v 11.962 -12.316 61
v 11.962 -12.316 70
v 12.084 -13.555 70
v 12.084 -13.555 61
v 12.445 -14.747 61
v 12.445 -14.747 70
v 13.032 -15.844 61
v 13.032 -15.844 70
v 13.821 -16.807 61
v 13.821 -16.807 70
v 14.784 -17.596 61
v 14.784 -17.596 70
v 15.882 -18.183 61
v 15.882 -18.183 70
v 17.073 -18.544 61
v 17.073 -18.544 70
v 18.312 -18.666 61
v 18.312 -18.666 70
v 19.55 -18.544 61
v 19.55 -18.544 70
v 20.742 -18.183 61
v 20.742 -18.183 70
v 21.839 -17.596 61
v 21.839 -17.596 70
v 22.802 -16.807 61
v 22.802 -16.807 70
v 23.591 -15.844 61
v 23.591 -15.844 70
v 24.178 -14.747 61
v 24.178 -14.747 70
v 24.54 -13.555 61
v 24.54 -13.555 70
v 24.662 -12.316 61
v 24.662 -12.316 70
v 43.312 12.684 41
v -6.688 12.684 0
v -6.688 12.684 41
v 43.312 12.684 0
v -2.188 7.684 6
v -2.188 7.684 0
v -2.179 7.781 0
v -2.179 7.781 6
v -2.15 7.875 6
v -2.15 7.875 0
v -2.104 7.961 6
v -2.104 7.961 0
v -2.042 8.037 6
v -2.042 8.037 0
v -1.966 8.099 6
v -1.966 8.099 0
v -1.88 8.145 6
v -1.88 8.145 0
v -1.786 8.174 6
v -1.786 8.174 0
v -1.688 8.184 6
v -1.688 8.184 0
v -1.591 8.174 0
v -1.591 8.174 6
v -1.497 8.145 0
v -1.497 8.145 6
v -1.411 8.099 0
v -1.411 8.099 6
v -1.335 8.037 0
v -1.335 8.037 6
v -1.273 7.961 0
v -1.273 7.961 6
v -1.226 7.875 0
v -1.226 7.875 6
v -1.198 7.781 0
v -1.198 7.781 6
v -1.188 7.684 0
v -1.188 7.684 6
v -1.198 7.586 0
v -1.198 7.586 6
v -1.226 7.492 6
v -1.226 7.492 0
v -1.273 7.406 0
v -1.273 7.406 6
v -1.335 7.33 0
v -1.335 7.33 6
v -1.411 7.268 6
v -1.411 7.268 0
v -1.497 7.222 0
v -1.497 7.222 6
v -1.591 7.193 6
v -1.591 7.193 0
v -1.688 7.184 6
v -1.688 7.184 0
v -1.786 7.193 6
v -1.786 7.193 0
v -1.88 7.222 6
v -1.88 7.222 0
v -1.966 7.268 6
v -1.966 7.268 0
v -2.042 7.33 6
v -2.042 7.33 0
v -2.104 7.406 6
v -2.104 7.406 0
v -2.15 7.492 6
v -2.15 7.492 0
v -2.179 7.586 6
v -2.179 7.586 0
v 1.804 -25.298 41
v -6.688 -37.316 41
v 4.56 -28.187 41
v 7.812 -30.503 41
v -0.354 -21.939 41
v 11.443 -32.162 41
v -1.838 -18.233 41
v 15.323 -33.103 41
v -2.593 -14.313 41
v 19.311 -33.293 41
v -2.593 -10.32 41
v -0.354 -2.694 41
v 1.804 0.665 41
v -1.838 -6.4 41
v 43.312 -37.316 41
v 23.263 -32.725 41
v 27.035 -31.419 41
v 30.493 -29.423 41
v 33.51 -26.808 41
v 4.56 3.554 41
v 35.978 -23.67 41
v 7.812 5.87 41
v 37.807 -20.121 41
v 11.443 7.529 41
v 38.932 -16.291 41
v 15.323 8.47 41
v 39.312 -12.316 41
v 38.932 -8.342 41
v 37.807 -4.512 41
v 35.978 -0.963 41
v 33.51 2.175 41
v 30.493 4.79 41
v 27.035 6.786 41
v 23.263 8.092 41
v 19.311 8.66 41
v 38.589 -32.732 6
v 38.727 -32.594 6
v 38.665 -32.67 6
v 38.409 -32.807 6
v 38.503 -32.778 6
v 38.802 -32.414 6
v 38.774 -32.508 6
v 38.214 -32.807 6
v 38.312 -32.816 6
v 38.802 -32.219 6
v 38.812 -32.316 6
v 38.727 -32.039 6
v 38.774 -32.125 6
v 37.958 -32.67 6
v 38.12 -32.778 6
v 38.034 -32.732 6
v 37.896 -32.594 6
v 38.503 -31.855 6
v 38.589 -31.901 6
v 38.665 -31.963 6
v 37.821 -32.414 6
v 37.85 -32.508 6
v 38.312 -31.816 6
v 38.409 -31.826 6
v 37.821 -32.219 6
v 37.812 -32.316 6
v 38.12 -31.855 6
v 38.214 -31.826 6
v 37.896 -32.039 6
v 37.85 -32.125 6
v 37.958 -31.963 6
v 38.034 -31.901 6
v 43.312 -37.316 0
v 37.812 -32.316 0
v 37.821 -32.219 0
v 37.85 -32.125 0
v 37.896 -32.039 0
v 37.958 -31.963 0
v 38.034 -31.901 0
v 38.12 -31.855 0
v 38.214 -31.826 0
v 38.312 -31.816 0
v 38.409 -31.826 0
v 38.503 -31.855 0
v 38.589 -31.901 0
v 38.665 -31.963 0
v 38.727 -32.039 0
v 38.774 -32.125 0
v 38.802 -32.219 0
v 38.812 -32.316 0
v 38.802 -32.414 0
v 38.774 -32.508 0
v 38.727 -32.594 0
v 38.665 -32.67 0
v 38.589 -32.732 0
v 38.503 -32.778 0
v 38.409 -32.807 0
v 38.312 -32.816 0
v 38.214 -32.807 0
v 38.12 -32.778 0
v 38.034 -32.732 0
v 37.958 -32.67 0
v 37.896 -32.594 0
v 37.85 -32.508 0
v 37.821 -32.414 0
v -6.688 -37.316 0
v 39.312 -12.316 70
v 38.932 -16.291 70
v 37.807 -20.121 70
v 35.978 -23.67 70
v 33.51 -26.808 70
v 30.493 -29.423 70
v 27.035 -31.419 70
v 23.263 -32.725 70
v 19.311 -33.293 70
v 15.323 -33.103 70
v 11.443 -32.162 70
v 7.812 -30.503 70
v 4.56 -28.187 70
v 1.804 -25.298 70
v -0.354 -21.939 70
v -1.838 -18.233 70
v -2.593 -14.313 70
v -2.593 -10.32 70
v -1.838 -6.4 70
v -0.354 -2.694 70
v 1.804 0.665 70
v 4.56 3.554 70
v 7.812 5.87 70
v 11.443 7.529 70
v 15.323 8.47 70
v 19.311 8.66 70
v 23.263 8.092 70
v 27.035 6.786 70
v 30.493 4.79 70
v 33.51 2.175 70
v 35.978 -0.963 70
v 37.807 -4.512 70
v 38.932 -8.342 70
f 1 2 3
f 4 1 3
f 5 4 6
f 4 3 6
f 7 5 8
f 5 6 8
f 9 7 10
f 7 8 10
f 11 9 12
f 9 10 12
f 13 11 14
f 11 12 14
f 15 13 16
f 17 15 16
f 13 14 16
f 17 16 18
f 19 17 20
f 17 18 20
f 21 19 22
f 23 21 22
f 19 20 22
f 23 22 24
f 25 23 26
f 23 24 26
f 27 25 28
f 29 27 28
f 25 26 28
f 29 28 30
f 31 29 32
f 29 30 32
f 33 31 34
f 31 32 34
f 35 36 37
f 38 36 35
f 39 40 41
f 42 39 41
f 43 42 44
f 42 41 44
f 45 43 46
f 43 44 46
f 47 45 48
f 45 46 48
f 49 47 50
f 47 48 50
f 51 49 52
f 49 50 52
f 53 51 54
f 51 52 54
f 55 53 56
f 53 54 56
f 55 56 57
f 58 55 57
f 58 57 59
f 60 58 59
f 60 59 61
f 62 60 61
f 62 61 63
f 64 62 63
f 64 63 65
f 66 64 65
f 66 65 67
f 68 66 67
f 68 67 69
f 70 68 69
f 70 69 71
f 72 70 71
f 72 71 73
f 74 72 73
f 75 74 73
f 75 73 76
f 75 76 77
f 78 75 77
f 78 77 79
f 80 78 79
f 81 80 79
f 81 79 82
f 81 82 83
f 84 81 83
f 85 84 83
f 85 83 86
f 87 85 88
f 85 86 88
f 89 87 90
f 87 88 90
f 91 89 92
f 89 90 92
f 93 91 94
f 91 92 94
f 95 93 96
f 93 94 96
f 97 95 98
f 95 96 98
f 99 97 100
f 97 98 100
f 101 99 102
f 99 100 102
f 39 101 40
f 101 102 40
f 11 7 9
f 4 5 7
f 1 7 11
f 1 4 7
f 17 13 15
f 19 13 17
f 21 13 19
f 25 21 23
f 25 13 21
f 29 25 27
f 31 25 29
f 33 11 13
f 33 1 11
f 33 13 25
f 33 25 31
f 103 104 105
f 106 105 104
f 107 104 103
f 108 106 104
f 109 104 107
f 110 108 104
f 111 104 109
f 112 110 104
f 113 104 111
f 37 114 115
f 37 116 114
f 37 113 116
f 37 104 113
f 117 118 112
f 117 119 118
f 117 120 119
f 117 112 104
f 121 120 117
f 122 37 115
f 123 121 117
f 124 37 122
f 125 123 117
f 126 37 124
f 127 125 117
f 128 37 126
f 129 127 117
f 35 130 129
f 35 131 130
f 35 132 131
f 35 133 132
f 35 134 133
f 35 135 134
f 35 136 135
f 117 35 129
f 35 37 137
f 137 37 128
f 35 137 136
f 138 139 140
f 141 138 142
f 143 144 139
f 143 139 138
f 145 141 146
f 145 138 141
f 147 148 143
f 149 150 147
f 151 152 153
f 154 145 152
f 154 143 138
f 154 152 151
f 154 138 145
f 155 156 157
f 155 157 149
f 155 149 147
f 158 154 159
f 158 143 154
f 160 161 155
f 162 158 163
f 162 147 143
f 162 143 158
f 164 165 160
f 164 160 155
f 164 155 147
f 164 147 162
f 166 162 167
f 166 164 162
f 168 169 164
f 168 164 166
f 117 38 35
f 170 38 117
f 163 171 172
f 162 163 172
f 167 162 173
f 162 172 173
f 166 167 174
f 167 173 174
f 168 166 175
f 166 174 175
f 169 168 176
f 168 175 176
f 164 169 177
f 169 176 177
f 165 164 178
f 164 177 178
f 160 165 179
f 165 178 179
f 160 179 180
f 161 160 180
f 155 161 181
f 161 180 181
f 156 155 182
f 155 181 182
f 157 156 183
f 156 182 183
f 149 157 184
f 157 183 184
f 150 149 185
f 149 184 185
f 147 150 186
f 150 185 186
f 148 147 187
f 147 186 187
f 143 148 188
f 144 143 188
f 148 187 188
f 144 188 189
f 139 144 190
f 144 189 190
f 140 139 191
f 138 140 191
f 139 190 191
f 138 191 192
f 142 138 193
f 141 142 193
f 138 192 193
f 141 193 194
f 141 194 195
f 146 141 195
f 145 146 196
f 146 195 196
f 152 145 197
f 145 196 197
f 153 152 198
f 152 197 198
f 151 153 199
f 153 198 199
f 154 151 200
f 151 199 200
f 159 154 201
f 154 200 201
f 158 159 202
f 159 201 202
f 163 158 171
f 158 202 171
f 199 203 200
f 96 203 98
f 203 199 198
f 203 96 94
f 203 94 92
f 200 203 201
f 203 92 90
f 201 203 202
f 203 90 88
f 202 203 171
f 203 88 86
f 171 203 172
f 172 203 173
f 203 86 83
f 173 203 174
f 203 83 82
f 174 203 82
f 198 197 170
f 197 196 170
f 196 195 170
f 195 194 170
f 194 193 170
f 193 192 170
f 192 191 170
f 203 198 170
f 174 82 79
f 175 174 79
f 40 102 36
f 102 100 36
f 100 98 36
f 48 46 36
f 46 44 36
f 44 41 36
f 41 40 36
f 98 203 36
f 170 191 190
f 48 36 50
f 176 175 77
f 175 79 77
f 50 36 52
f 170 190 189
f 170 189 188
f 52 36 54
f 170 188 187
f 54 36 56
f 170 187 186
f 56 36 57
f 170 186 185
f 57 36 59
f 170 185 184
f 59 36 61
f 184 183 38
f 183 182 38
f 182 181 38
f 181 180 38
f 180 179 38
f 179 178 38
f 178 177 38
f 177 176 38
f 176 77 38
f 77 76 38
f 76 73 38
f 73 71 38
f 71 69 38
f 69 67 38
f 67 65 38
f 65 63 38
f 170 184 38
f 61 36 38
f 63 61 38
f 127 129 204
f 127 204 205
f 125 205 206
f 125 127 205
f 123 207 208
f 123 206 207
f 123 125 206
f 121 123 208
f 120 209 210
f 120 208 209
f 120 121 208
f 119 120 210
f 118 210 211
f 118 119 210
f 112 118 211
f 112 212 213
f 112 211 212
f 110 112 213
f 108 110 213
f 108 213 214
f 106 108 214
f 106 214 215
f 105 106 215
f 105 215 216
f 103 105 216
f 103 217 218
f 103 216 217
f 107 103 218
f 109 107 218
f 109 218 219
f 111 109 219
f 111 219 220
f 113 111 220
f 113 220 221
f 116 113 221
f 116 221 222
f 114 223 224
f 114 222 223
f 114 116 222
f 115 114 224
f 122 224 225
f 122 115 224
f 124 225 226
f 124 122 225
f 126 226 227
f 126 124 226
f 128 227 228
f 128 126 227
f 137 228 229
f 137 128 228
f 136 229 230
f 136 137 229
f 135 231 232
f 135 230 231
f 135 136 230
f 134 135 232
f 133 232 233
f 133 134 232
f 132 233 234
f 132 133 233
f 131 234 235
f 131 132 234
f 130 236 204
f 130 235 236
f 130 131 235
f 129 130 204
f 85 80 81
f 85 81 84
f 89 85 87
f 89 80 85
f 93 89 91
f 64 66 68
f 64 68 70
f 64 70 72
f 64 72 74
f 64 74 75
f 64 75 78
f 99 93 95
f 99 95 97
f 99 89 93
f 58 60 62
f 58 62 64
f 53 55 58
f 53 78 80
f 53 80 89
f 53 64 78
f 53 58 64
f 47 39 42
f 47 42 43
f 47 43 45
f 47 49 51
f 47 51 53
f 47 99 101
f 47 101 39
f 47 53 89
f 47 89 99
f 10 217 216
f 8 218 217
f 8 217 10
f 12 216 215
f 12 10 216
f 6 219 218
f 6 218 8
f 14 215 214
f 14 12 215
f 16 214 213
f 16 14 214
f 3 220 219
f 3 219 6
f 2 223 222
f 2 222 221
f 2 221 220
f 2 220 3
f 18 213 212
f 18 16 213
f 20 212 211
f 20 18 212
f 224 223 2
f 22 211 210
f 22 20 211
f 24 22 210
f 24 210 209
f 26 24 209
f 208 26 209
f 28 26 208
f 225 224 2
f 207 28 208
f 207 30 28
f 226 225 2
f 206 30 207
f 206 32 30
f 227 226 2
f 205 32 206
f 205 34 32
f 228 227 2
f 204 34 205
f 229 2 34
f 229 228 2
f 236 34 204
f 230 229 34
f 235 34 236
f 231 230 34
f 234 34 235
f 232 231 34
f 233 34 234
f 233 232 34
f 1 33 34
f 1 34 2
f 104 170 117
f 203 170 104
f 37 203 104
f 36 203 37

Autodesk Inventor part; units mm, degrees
ref_plane "YZ Plane" through (0, 0, 0) normal (1, 0, 0) x (0, 1, 0)
ref_plane "XZ Plane" through (0, 0, 0) normal (0, 1, 0) x (-1, 0, 0)
ref_plane "XY Plane" through (0, 0, 0) normal (0, 0, 1) x (1, 0, 0)
sketch "Sketch1" plane through (0, 0, 0) normal (0, 0, 1) x (1, 0, 0)
  line L0 (-6.6884, 12.6835) -> (43.3116, 12.6835)
  line L1 (43.3116, 12.6835) -> (43.3116, -37.3165)
  line L2 (43.3116, -37.3165) -> (-6.6884, -37.3165)
  line L3 (-6.6884, -37.3165) -> (-6.6884, 12.6835)
  point P0 (0, 0)
  dimension "d0" = 50
  dimension "d1" = 50
extrude "Extrusion1" add sketch "Sketch1" along normal blind 41
sketch "Sketch2" plane through (0, 0, 41) normal (0, 0, 1) x (1, 0, 0)
  circle A0 centre (18.3116, -12.3165) radius 21
  point P0 (0, 0)
  dimension "d4" = 42
extrude "Extrusion2" add sketch "Sketch2" along normal blind 29
sketch "Sketch3" plane through (18.3116, -12.3165, 70) normal (0, 0, 1) x (1, 0, 0)
  circle A0 centre (0, 0) radius 21 projected
  circle A1 centre (0, 0) radius 6.35
  point P0 (-18.3116, 12.3165)
  dimension "d7" = 12.7
extrude "Extrusion3" cut sketch "Sketch3" against normal blind 29 contours A1
sketch "Sketch4" plane through (18.3116, -12.3165, 41) normal (0, 0, 1) x (1, 0, 0)
  circle A0 centre (0, 0) radius 6.35 projected
  point P0 (-18.3116, 12.3165)
extrude "Extrusion4" add sketch "Sketch4" along normal blind 21
sketch "Sketch5" plane through (18.3116, -12.3165, 62) normal (0, 0, 1) x (1, 0, 0)
  circle A0 centre (0, 0) radius 6.35 projected
  point P0 (-18.3116, 12.3165)
extrude "Extrusion5" cut sketch "Sketch5" against normal blind 1
sketch "Sketch6" plane through (18.3116, -12.3165, 61) normal (0, 0, 1) x (1, 0, 0)
  circle A0 centre (0, 0) radius 6.35 projected
  line L0 (-6.35, 0) -> (6.35, 0)
  point P0 (-18.3116, 12.3165)
extrude "Extrusion6" add sketch "Sketch6" along normal blind 8 contours L0 A0 picked at (1.8268, 2.3873)
sketch "Sketch7" plane through (18.3116, -12.3165, 69) normal (0, 0, 1) x (1, 0, 0)
  arc A0 (6.35, 0) -> (-6.35, 0) centre (0, 0) ccw projected
  line L0 (6.35, 0) -> (-6.35, 0) projected
  point P0 (-18.3116, 12.3165)
extrude "Extrusion7" add sketch "Sketch7" along normal blind 1
sketch "Sketch8" plane through (0, 0, 0) normal (0, 0, -1) x (-1, 0, 0)
  line L0 (-43.3116, 12.6835) -> (-38.3116, 12.6835)
  line L1 (-38.3116, 12.6835) -> (-38.3116, 7.6835)
  line L2 (-38.3116, 7.6835) -> (-43.3116, 7.6835)
  line L3 (-43.3116, 7.6835) -> (-43.3116, 12.6835)
  line L4 (6.6884, -37.3165) -> (1.6884, -37.3165)
  line L5 (1.6884, -37.3165) -> (1.6884, -32.3165)
  line L6 (1.6884, -32.3165) -> (6.6884, -32.3165)
  line L7 (6.6884, -32.3165) -> (6.6884, -37.3165)
  line L8 (-38.3116, 7.6835) -> (1.6884, 7.6835)
  line L9 (1.6884, 7.6835) -> (1.6884, -32.3165)
  line L10 (1.6884, -32.3165) -> (-38.3116, -32.3165)
  line L11 (-38.3116, -32.3165) -> (-38.3116, 7.6835)
  circle A0 centre (-38.3116, -32.3165) radius 0.5
  circle A1 centre (1.6884, 7.6835) radius 0.5
  point P0 (0, 0)
  dimension "d18" = 5
  dimension "d19" = 5
  dimension "d20" = 5
  dimension "d21" = 5
  dimension "d22" = 1
  dimension "d23" = 1
extrude "Extrusion8" cut sketch "Sketch8" against normal blind 6 contours A1 L9 L8 | L8 L9 A1 | A0 L10 L11 | L11 L10 A0
properties part number "hmodel"
